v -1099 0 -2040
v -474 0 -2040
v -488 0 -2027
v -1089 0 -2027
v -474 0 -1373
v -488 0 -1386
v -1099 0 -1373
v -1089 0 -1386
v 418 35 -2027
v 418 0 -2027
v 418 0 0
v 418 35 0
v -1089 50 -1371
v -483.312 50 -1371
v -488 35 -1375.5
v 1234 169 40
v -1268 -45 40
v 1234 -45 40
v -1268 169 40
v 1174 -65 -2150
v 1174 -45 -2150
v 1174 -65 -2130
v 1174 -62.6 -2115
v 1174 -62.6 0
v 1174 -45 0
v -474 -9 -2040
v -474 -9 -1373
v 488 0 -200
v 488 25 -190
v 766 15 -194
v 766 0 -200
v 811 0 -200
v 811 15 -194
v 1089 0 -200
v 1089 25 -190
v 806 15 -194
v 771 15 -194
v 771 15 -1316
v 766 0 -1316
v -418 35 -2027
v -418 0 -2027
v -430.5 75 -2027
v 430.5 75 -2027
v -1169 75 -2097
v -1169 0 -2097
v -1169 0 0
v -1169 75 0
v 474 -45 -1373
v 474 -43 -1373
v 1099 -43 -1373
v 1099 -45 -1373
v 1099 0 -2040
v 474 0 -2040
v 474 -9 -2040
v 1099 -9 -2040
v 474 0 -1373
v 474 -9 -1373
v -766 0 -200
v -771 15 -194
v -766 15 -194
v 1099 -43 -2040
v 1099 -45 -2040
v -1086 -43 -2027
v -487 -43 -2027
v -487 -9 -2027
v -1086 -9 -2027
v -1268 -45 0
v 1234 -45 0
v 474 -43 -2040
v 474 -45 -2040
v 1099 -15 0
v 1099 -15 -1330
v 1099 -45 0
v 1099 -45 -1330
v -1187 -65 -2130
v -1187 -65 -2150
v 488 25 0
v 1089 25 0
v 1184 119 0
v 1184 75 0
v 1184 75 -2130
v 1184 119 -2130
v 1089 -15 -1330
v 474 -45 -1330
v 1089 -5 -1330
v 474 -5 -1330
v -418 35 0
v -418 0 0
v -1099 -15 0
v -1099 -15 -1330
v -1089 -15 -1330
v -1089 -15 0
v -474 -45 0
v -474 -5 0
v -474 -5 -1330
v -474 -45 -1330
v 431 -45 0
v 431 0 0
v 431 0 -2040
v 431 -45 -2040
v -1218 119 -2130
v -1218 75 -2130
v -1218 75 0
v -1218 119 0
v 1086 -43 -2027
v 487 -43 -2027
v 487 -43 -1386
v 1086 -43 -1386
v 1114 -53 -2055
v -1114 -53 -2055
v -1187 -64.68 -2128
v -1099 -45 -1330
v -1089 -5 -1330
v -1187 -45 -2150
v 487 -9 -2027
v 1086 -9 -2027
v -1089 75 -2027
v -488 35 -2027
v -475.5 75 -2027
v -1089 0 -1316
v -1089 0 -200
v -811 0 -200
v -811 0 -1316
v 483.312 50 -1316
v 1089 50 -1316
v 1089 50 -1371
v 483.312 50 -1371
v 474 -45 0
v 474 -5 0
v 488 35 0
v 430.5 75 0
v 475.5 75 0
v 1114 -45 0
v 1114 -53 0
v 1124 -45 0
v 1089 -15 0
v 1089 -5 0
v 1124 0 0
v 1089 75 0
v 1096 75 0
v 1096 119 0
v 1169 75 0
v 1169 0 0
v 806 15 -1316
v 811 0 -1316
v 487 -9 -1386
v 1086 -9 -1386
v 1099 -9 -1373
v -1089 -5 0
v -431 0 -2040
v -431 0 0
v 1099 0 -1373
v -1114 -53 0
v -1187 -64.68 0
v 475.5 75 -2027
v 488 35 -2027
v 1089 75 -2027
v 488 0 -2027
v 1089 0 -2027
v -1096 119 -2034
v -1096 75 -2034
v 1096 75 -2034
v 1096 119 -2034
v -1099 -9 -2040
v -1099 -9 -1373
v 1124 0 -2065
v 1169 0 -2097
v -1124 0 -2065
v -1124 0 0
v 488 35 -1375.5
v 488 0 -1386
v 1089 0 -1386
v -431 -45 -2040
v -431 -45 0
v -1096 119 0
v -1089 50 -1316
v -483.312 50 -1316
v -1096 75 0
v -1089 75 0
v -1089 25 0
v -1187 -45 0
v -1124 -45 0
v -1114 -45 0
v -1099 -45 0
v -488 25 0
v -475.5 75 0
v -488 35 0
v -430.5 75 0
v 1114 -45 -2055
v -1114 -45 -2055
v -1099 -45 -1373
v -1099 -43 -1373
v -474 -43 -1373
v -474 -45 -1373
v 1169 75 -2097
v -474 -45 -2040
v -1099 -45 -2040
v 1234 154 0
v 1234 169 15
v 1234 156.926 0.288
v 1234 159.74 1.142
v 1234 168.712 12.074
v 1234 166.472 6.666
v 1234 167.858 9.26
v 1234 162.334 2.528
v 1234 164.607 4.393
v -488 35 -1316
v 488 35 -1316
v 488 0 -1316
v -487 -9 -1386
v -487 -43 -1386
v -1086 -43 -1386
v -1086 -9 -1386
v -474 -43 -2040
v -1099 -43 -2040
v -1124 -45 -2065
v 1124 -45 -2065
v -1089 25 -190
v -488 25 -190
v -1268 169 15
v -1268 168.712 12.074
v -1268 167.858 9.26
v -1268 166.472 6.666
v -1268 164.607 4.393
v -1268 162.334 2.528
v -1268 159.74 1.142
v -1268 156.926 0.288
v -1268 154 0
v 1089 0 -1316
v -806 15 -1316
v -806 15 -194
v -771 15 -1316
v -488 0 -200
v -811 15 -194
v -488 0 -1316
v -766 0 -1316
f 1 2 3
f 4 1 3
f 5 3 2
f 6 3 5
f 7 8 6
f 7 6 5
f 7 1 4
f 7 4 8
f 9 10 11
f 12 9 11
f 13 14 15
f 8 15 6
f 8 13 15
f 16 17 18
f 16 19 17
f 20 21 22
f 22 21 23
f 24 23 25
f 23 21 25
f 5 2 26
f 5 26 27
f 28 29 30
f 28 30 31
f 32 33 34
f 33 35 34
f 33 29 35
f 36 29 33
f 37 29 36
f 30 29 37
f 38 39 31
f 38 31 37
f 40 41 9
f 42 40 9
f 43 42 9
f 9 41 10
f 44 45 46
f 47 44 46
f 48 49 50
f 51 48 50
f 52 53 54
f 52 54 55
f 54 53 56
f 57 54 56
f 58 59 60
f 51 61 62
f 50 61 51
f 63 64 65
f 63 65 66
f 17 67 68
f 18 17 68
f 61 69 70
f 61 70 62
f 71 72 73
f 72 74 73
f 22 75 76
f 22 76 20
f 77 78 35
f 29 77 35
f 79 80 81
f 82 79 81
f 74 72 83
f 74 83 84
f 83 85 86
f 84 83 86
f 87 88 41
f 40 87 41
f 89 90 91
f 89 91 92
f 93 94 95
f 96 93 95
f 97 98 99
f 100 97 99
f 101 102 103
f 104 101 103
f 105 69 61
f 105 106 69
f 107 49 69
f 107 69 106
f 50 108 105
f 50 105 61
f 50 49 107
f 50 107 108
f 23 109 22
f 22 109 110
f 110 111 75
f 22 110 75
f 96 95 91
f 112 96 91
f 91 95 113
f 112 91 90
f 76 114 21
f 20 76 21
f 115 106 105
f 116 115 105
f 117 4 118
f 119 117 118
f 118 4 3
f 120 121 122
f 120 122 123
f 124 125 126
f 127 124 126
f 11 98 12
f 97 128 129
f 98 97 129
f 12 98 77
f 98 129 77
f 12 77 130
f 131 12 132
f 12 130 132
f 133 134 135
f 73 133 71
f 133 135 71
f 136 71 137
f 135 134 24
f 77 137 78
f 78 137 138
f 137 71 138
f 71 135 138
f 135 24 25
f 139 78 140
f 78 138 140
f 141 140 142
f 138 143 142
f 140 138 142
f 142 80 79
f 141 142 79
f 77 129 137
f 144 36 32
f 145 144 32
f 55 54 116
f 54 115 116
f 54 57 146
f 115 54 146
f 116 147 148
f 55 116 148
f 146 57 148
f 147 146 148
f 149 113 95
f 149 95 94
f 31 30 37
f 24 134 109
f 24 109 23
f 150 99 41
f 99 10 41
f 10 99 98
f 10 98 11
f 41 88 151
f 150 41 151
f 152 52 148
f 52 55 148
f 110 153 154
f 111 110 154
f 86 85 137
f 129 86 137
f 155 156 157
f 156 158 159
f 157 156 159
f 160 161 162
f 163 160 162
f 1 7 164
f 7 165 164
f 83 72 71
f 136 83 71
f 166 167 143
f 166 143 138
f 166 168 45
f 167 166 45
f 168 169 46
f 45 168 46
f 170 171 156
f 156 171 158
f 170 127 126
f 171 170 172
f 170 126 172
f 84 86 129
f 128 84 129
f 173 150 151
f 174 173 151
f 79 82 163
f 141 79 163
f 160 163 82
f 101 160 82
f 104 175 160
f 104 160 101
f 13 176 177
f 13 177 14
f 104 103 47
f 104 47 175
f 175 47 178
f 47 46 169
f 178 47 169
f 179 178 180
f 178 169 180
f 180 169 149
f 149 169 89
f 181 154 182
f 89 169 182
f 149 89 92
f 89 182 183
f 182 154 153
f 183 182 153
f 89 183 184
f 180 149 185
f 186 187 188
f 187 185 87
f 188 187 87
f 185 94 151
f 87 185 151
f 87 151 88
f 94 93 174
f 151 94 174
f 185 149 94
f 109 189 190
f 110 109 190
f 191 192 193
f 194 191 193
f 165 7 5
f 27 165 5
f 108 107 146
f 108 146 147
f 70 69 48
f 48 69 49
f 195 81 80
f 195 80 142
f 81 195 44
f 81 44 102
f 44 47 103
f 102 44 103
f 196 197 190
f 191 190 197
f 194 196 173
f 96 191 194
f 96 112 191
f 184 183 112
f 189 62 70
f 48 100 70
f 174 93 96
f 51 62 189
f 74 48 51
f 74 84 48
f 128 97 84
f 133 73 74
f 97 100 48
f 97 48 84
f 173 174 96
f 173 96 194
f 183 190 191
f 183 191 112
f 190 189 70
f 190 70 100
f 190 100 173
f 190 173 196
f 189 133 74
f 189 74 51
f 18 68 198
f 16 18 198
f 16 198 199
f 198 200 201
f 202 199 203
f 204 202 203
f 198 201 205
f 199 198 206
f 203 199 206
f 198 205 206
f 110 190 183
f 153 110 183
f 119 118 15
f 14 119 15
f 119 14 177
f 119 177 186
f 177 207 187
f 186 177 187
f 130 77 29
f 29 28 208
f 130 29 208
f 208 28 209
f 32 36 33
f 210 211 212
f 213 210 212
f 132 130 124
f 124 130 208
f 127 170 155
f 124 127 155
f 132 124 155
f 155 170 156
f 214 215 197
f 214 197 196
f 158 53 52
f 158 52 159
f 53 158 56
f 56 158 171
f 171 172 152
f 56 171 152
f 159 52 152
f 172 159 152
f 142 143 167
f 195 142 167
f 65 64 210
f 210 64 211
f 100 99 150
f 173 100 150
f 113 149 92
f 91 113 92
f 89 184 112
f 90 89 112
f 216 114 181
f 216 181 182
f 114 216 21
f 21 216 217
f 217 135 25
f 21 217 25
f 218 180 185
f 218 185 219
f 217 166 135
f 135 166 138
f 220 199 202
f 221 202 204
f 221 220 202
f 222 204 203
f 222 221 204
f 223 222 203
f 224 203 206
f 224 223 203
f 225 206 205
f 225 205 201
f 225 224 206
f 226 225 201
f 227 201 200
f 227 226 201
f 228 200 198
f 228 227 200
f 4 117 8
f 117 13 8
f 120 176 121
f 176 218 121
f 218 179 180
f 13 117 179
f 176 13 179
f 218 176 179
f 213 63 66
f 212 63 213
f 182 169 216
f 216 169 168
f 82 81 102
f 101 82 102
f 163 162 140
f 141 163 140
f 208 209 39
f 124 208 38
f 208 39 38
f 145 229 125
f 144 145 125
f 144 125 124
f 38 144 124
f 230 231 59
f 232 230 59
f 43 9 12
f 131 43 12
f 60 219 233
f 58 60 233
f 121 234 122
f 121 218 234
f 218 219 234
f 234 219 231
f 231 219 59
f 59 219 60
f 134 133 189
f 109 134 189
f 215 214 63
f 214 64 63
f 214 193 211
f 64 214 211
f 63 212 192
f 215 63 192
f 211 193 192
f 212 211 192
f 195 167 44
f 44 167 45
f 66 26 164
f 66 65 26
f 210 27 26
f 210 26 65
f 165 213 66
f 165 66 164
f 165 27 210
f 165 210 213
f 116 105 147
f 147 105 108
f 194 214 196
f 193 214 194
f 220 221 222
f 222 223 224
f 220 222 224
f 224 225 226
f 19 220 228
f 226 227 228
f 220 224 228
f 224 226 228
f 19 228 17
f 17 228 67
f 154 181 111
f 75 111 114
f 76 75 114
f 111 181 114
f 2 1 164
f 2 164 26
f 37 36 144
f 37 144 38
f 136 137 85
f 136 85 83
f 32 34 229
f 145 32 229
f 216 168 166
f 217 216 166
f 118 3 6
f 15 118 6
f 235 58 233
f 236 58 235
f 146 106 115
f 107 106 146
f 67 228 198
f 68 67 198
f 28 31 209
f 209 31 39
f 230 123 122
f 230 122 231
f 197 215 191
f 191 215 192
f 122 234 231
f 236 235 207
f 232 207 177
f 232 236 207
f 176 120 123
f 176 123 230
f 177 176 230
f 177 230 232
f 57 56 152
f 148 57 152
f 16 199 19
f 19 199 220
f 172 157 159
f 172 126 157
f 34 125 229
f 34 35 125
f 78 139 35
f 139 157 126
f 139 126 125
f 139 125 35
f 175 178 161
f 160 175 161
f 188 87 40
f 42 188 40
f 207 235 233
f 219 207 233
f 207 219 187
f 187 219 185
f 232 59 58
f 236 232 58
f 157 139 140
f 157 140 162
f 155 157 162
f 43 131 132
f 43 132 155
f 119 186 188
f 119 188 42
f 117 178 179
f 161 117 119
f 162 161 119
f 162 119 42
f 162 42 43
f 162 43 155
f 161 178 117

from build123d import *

# Parameters (mm, degrees)
F0_W          = 625
F0_H          = 667
F1_DEPTH      = 45
F3_W          = 645
F3_H          = 687
F3_W_2        = 599
F3_H_2        = 641
F4_DEPTH      = 34
F7_DEPTH      = 75
F9_DEPTH      = 20
F10_T1_DEPTH  = 2228
F10_T3_DEPTH  = 2249.90940659
F10_T9_DEPTH  = 2249.90940659
F10_T15_DEPTH = 2422.90940659
F10_T23_DEPTH = 2422.90940659
F10_T28_DEPTH = 2249.90940659
F11_SIZE2     = 40
F11_SIZE      = 12.5
F13_DEPTH     = 10
F15_DEPTH     = 620
F16_W         = 45
F16_H         = 1126
F17_DEPTH     = 15
F18_T4_DEPTH  = 1160.9259151598
F18_T10_DEPTH = 1160.9259151598
F18_T16_DEPTH = 1160.9259151598
F18_T22_DEPTH = 1160.9259151598
F20_DEPTH     = 44
F22_DEPTH     = 40
F23_R         = 15


# Not quite as in the source:
# - a fillet or chamfer that OpenCascade refuses, or shapes differently, is made with other operations: its cross-section is extruded or revolved along the edge and cut away or added
# - a pattern or mirror of a feature is missing from the dataset's text; its kind, count and spacing are read off the source's solid


with BuildPart() as f1:
    # F0 (on Front) → F1 (new body)
    with BuildSketch(Plane.XZ):
        Polygon((474, 0), (431, 0), (431, -2040), (-431, -2040), (-431, 0), (-474, 0), (-474, -1330), (-1099, -1330), (-1099, 0), (-1124, 0), (-1124, -2065), (1124, -2065), (1124, 0), (1099, 0), (1099, -1330), (474, -1330), align=None)
        with Locations((-786.5, -1706.5)):
            Rectangle(F0_W, F0_H, mode=Mode.SUBTRACT)
        with Locations((786.5, -1706.5)):
            Rectangle(F0_W, F0_H, mode=Mode.SUBTRACT)
    extrude(amount=F1_DEPTH)

    # F3 (on offset) → F4 (join)
    with BuildSketch(Plane.XZ.offset(43)):
        with Locations((786.5, -1706.5)):
            Rectangle(F3_W, F3_H)
        with Locations((786.5, -1706.5)):
            Rectangle(F3_W_2, F3_H_2, mode=Mode.SUBTRACT)
    extrude(amount=-F4_DEPTH)

    # F6: F1 across plane


with BuildPart() as f1_1:
    add(f1.part)
    add(f1.part.mirror(Plane.YZ))

    # F5 (on face) → F7 (join)
    with BuildSketch(Plane(origin=(0, 0, 0), x_dir=(-1, 0, 0), z_dir=(0, 1, 0))):
        Polygon((-488, -2027), (-1099, -2027), (-1099, 0), (-1169, 0), (-1169, -2097), (1169, -2097), (1169, 0), (1099, 0), (1099, -2027), (488, -2027), (488, 0), (418, 0), (418, -2027), (-418, -2027), (-418, 0), (-488, 0), align=None)
    extrude(amount=F7_DEPTH)

    # F8 (on face) → F9 (join)
    with BuildSketch(Plane.XZ.offset(45)):
        Polygon((1114, 0), (1114, -2055), (-1114, -2055), (-1114, 0), (-1187, 0), (-1187, -2150), (1174, -2150), (1174, 0), align=None)
    extrude(amount=F9_DEPTH)

    # F10: chamfer of 12 x 75 on 3 edges, made by hand

    # F10_s2 → F10_t1 (cut)
    with BuildSketch(Plane.YZ.offset(-1114)):
        Polygon((-53, -2055), (-65, -2130), (-65, -2055), align=None)
    extrude(amount=F10_T1_DEPTH, mode=Mode.SUBTRACT)

    # F10_s4 → F10_t3 (cut)
    with BuildSketch(Plane.XY.offset(-2055)):
        Polygon((-1114, -53), (-1189, -65), (-1114, -65), align=None)
        Polygon((1114, -53), (1189, -65), (1114, -65), align=None)
    extrude(amount=F10_T3_DEPTH, mode=Mode.SUBTRACT)


with BuildPart() as f10_tool7:
    # F10_s8 → F10_t9 (new body)
    with BuildSketch(Plane.XY):
        Polygon((1114, -53), (1189, -65), (1114, -65), align=None)
    extrude(amount=-F10_T9_DEPTH)

    split(bisect_by=Plane.XY.offset(-2055), keep=Keep.BOTTOM)

    split(bisect_by=Plane.YZ.offset(1174), keep=Keep.BOTTOM)

    split(bisect_by=Plane.XY.offset(-2150), keep=Keep.TOP)


with BuildPart() as f10_tool13:
    # F10_s14 → F10_t15 (new body)
    with BuildSketch(Plane.YZ.offset(1308.90940659)):
        Polygon((-53, -2055), (-65, -2130), (-65, -2055), align=None)
    extrude(amount=-F10_T15_DEPTH)

    split(bisect_by=Plane.YZ.offset(1114), keep=Keep.TOP)

    split(bisect_by=Plane.YZ.offset(1174), keep=Keep.BOTTOM)


with BuildPart() as f10_tool7_1:
    add(f10_tool7.part)

    # F10_t18: intersect F10_tool13
    add(f10_tool13.part, mode=Mode.INTERSECT)


with BuildPart() as f1_2:
    add(f1_1.part)

    # F10_t5: cut F10_tool7
    add(f10_tool7_1.part, mode=Mode.SUBTRACT)


with BuildPart() as f10_tool21:
    # F10_s22 → F10_t23 (new body)
    with BuildSketch(Plane.YZ.offset(1114)):
        Polygon((-53, -2055), (-65, -2130), (-65, -2055), align=None)
    extrude(amount=-F10_T23_DEPTH)

    split(bisect_by=Plane.YZ.offset(-1114), keep=Keep.BOTTOM)

    split(bisect_by=Plane.YZ.offset(-1187), keep=Keep.TOP)


with BuildPart() as f10_tool26:
    # F10_s27 → F10_t28 (new body)
    with BuildSketch(Plane.XY.offset(-2249.90940659)):
        Polygon((-1114, -53), (-1189, -65), (-1114, -65), align=None)
    extrude(amount=F10_T28_DEPTH)

    split(bisect_by=Plane.XY.offset(-2055), keep=Keep.BOTTOM)

    split(bisect_by=Plane.YZ.offset(-1187), keep=Keep.TOP)

    split(bisect_by=Plane.XY.offset(-2150), keep=Keep.TOP)


with BuildPart() as f10_tool21_1:
    add(f10_tool21.part)

    # F10_t32: intersect F10_tool26
    add(f10_tool26.part, mode=Mode.INTERSECT)


with BuildPart() as f1_3:
    add(f1_2.part)

    # F10_t19: cut F10_tool21
    add(f10_tool21_1.part, mode=Mode.SUBTRACT)

    # F11
    f11_edges = [f1_3.edges().sort_by_distance(p)[0] for p in [
        (-488, 75, -1013.5),
        (-418, 75, -1013.5),
        (488, 75, -1013.5),
        (418, 75, -1013.5),
    ]]
    f11_side = f1_3.faces().sort_by_distance((793.5, 75, -2058.406453))[0]
    chamfer(f11_edges, length=F11_SIZE, length2=F11_SIZE2, reference=f11_side)

    # F12 (on face) → F13 (join)
    with BuildSketch(Plane(origin=(1099, 0, 0), x_dir=(0, -1, 0), z_dir=(-1, 0, 0))):
        Polygon((0, -2027), (0, -1373), (0, -1330), (15, -1330), (15, 0), (-75, 0), (-75, -2027), align=None)
    f13 = extrude(amount=F13_DEPTH)

    # F13_copies: F13 across plane
    add(f13.mirror(Plane(origin=(0, 0, 0), x_dir=(0, 0, -1), z_dir=(-1, 0, 0))))

    # F14 (on face) → F15 (join)
    with BuildSketch(Plane(origin=(1089, 0, 0), x_dir=(0, -1, 0), z_dir=(-1, 0, 0))):
        Polygon((0, -1386), (0, -1373), (0, -1330), (5, -1330), (5, 0), (-25, 0), (-25, -190), (0, -200), (0, -1316), (-50, -1316), (-50, -1371), align=None)
    f15 = extrude(amount=F15_DEPTH)

    # F15_copies: F15 across plane
    add(f15.mirror(Plane(origin=(0, 0, 0), x_dir=(0, 0, -1), z_dir=(-1, 0, 0))))

    # F16 (on face) → F17 (join)
    with BuildSketch(Plane(origin=(0, 0, 0), x_dir=(-1, 0, 0), z_dir=(0, 1, 0))):
        with Locations((-788.5, -753)):
            Rectangle(F16_W, F16_H)
    f17 = extrude(amount=F17_DEPTH)

    # F17_copies: F17 across plane
    add(f17.mirror(Plane(origin=(0, 0, 0), x_dir=(0, 0, -1), z_dir=(-1, 0, 0))))

    # F18: chamfer of 5 x 15 on 4 edges, made by hand


with BuildPart() as f18_tool2:
    # F18_s3 → F18_t4 (new body)
    with BuildSketch(Plane.XY.offset(-1316)):
        Polygon((766, 0), (771, 15), (766, 15), align=None)
    extrude(amount=F18_T4_DEPTH)

    split(bisect_by=Plane(origin=(0, 68.9655172414, -172.4137931034), x_dir=(1, 0, 0), z_dir=(0, 0.3713906764, -0.9284766909)), keep=Keep.TOP)

    split(bisect_by=Plane.XZ, keep=Keep.BOTTOM)


with BuildPart() as f1_4:
    add(f1_3.part)

    # F18_t1: cut F18_tool2
    add(f18_tool2.part, mode=Mode.SUBTRACT)


with BuildPart() as f18_tool8:
    # F18_s9 → F18_t10 (new body)
    with BuildSketch(Plane.XY.offset(-155.0740848402)):
        Polygon((806, 15), (811, 0), (811, 15), align=None)
    extrude(amount=-F18_T10_DEPTH)

    split(bisect_by=Plane(origin=(0, 68.9655172414, -172.4137931034), x_dir=(1, 0, 0), z_dir=(0, 0.3713906764, -0.9284766909)), keep=Keep.TOP)

    split(bisect_by=Plane.XZ, keep=Keep.BOTTOM)


with BuildPart() as f1_5:
    add(f1_4.part)

    # F18_t7: cut F18_tool8
    add(f18_tool8.part, mode=Mode.SUBTRACT)


with BuildPart() as f18_tool14:
    # F18_s15 → F18_t16 (new body)
    with BuildSketch(Plane.XY.offset(-155.0740848402)):
        Polygon((-811, 0), (-806, 15), (-811, 15), align=None)
    extrude(amount=-F18_T16_DEPTH)

    split(bisect_by=Plane(origin=(0, 68.9655172414, -172.4137931034), x_dir=(1, 0, 0), z_dir=(0, 0.3713906764, -0.9284766909)), keep=Keep.TOP)

    split(bisect_by=Plane.XZ, keep=Keep.BOTTOM)


with BuildPart() as f1_6:
    add(f1_5.part)

    # F18_t13: cut F18_tool14
    add(f18_tool14.part, mode=Mode.SUBTRACT)


with BuildPart() as f18_tool20:
    # F18_s21 → F18_t22 (new body)
    with BuildSketch(Plane.XY.offset(-1316)):
        Polygon((-771, 15), (-766, 0), (-766, 15), align=None)
    extrude(amount=F18_T22_DEPTH)

    split(bisect_by=Plane(origin=(0, 68.9655172414, -172.4137931034), x_dir=(1, 0, 0), z_dir=(0, 0.3713906764, -0.9284766909)), keep=Keep.TOP)

    split(bisect_by=Plane.XZ, keep=Keep.BOTTOM)


with BuildPart() as f1_7:
    add(f1_6.part)

    # F18_t19: cut F18_tool20
    add(f18_tool20.part, mode=Mode.SUBTRACT)

    # F19 (on face) → F20 (join)
    with BuildSketch(Plane(origin=(0, 75, 0), x_dir=(-1, 0, 0), z_dir=(0, 1, 0))):
        Polygon((1096, 0), (1096, -2034), (-1096, -2034), (-1096, 0), (-1184, 0), (-1184, -2130), (1218, -2130), (1218, 0), align=None)
    extrude(amount=F20_DEPTH)


with BuildPart() as f22:
    # F21 (on face) → F22 (new body)
    with BuildSketch(Plane.XY):
        Polygon((-1268, -45), (1124, -45), (1234, -45), (1234, 169), (-1268, 169), align=None)
    extrude(amount=F22_DEPTH)

    # F23
    f23_edges = [f22.edges().sort_by_distance(p)[0] for p in [
        (-17, 169, 0),
    ]]
    fillet(f23_edges, radius=F23_R)


solid = Compound([f1_7.part, f22.part])
